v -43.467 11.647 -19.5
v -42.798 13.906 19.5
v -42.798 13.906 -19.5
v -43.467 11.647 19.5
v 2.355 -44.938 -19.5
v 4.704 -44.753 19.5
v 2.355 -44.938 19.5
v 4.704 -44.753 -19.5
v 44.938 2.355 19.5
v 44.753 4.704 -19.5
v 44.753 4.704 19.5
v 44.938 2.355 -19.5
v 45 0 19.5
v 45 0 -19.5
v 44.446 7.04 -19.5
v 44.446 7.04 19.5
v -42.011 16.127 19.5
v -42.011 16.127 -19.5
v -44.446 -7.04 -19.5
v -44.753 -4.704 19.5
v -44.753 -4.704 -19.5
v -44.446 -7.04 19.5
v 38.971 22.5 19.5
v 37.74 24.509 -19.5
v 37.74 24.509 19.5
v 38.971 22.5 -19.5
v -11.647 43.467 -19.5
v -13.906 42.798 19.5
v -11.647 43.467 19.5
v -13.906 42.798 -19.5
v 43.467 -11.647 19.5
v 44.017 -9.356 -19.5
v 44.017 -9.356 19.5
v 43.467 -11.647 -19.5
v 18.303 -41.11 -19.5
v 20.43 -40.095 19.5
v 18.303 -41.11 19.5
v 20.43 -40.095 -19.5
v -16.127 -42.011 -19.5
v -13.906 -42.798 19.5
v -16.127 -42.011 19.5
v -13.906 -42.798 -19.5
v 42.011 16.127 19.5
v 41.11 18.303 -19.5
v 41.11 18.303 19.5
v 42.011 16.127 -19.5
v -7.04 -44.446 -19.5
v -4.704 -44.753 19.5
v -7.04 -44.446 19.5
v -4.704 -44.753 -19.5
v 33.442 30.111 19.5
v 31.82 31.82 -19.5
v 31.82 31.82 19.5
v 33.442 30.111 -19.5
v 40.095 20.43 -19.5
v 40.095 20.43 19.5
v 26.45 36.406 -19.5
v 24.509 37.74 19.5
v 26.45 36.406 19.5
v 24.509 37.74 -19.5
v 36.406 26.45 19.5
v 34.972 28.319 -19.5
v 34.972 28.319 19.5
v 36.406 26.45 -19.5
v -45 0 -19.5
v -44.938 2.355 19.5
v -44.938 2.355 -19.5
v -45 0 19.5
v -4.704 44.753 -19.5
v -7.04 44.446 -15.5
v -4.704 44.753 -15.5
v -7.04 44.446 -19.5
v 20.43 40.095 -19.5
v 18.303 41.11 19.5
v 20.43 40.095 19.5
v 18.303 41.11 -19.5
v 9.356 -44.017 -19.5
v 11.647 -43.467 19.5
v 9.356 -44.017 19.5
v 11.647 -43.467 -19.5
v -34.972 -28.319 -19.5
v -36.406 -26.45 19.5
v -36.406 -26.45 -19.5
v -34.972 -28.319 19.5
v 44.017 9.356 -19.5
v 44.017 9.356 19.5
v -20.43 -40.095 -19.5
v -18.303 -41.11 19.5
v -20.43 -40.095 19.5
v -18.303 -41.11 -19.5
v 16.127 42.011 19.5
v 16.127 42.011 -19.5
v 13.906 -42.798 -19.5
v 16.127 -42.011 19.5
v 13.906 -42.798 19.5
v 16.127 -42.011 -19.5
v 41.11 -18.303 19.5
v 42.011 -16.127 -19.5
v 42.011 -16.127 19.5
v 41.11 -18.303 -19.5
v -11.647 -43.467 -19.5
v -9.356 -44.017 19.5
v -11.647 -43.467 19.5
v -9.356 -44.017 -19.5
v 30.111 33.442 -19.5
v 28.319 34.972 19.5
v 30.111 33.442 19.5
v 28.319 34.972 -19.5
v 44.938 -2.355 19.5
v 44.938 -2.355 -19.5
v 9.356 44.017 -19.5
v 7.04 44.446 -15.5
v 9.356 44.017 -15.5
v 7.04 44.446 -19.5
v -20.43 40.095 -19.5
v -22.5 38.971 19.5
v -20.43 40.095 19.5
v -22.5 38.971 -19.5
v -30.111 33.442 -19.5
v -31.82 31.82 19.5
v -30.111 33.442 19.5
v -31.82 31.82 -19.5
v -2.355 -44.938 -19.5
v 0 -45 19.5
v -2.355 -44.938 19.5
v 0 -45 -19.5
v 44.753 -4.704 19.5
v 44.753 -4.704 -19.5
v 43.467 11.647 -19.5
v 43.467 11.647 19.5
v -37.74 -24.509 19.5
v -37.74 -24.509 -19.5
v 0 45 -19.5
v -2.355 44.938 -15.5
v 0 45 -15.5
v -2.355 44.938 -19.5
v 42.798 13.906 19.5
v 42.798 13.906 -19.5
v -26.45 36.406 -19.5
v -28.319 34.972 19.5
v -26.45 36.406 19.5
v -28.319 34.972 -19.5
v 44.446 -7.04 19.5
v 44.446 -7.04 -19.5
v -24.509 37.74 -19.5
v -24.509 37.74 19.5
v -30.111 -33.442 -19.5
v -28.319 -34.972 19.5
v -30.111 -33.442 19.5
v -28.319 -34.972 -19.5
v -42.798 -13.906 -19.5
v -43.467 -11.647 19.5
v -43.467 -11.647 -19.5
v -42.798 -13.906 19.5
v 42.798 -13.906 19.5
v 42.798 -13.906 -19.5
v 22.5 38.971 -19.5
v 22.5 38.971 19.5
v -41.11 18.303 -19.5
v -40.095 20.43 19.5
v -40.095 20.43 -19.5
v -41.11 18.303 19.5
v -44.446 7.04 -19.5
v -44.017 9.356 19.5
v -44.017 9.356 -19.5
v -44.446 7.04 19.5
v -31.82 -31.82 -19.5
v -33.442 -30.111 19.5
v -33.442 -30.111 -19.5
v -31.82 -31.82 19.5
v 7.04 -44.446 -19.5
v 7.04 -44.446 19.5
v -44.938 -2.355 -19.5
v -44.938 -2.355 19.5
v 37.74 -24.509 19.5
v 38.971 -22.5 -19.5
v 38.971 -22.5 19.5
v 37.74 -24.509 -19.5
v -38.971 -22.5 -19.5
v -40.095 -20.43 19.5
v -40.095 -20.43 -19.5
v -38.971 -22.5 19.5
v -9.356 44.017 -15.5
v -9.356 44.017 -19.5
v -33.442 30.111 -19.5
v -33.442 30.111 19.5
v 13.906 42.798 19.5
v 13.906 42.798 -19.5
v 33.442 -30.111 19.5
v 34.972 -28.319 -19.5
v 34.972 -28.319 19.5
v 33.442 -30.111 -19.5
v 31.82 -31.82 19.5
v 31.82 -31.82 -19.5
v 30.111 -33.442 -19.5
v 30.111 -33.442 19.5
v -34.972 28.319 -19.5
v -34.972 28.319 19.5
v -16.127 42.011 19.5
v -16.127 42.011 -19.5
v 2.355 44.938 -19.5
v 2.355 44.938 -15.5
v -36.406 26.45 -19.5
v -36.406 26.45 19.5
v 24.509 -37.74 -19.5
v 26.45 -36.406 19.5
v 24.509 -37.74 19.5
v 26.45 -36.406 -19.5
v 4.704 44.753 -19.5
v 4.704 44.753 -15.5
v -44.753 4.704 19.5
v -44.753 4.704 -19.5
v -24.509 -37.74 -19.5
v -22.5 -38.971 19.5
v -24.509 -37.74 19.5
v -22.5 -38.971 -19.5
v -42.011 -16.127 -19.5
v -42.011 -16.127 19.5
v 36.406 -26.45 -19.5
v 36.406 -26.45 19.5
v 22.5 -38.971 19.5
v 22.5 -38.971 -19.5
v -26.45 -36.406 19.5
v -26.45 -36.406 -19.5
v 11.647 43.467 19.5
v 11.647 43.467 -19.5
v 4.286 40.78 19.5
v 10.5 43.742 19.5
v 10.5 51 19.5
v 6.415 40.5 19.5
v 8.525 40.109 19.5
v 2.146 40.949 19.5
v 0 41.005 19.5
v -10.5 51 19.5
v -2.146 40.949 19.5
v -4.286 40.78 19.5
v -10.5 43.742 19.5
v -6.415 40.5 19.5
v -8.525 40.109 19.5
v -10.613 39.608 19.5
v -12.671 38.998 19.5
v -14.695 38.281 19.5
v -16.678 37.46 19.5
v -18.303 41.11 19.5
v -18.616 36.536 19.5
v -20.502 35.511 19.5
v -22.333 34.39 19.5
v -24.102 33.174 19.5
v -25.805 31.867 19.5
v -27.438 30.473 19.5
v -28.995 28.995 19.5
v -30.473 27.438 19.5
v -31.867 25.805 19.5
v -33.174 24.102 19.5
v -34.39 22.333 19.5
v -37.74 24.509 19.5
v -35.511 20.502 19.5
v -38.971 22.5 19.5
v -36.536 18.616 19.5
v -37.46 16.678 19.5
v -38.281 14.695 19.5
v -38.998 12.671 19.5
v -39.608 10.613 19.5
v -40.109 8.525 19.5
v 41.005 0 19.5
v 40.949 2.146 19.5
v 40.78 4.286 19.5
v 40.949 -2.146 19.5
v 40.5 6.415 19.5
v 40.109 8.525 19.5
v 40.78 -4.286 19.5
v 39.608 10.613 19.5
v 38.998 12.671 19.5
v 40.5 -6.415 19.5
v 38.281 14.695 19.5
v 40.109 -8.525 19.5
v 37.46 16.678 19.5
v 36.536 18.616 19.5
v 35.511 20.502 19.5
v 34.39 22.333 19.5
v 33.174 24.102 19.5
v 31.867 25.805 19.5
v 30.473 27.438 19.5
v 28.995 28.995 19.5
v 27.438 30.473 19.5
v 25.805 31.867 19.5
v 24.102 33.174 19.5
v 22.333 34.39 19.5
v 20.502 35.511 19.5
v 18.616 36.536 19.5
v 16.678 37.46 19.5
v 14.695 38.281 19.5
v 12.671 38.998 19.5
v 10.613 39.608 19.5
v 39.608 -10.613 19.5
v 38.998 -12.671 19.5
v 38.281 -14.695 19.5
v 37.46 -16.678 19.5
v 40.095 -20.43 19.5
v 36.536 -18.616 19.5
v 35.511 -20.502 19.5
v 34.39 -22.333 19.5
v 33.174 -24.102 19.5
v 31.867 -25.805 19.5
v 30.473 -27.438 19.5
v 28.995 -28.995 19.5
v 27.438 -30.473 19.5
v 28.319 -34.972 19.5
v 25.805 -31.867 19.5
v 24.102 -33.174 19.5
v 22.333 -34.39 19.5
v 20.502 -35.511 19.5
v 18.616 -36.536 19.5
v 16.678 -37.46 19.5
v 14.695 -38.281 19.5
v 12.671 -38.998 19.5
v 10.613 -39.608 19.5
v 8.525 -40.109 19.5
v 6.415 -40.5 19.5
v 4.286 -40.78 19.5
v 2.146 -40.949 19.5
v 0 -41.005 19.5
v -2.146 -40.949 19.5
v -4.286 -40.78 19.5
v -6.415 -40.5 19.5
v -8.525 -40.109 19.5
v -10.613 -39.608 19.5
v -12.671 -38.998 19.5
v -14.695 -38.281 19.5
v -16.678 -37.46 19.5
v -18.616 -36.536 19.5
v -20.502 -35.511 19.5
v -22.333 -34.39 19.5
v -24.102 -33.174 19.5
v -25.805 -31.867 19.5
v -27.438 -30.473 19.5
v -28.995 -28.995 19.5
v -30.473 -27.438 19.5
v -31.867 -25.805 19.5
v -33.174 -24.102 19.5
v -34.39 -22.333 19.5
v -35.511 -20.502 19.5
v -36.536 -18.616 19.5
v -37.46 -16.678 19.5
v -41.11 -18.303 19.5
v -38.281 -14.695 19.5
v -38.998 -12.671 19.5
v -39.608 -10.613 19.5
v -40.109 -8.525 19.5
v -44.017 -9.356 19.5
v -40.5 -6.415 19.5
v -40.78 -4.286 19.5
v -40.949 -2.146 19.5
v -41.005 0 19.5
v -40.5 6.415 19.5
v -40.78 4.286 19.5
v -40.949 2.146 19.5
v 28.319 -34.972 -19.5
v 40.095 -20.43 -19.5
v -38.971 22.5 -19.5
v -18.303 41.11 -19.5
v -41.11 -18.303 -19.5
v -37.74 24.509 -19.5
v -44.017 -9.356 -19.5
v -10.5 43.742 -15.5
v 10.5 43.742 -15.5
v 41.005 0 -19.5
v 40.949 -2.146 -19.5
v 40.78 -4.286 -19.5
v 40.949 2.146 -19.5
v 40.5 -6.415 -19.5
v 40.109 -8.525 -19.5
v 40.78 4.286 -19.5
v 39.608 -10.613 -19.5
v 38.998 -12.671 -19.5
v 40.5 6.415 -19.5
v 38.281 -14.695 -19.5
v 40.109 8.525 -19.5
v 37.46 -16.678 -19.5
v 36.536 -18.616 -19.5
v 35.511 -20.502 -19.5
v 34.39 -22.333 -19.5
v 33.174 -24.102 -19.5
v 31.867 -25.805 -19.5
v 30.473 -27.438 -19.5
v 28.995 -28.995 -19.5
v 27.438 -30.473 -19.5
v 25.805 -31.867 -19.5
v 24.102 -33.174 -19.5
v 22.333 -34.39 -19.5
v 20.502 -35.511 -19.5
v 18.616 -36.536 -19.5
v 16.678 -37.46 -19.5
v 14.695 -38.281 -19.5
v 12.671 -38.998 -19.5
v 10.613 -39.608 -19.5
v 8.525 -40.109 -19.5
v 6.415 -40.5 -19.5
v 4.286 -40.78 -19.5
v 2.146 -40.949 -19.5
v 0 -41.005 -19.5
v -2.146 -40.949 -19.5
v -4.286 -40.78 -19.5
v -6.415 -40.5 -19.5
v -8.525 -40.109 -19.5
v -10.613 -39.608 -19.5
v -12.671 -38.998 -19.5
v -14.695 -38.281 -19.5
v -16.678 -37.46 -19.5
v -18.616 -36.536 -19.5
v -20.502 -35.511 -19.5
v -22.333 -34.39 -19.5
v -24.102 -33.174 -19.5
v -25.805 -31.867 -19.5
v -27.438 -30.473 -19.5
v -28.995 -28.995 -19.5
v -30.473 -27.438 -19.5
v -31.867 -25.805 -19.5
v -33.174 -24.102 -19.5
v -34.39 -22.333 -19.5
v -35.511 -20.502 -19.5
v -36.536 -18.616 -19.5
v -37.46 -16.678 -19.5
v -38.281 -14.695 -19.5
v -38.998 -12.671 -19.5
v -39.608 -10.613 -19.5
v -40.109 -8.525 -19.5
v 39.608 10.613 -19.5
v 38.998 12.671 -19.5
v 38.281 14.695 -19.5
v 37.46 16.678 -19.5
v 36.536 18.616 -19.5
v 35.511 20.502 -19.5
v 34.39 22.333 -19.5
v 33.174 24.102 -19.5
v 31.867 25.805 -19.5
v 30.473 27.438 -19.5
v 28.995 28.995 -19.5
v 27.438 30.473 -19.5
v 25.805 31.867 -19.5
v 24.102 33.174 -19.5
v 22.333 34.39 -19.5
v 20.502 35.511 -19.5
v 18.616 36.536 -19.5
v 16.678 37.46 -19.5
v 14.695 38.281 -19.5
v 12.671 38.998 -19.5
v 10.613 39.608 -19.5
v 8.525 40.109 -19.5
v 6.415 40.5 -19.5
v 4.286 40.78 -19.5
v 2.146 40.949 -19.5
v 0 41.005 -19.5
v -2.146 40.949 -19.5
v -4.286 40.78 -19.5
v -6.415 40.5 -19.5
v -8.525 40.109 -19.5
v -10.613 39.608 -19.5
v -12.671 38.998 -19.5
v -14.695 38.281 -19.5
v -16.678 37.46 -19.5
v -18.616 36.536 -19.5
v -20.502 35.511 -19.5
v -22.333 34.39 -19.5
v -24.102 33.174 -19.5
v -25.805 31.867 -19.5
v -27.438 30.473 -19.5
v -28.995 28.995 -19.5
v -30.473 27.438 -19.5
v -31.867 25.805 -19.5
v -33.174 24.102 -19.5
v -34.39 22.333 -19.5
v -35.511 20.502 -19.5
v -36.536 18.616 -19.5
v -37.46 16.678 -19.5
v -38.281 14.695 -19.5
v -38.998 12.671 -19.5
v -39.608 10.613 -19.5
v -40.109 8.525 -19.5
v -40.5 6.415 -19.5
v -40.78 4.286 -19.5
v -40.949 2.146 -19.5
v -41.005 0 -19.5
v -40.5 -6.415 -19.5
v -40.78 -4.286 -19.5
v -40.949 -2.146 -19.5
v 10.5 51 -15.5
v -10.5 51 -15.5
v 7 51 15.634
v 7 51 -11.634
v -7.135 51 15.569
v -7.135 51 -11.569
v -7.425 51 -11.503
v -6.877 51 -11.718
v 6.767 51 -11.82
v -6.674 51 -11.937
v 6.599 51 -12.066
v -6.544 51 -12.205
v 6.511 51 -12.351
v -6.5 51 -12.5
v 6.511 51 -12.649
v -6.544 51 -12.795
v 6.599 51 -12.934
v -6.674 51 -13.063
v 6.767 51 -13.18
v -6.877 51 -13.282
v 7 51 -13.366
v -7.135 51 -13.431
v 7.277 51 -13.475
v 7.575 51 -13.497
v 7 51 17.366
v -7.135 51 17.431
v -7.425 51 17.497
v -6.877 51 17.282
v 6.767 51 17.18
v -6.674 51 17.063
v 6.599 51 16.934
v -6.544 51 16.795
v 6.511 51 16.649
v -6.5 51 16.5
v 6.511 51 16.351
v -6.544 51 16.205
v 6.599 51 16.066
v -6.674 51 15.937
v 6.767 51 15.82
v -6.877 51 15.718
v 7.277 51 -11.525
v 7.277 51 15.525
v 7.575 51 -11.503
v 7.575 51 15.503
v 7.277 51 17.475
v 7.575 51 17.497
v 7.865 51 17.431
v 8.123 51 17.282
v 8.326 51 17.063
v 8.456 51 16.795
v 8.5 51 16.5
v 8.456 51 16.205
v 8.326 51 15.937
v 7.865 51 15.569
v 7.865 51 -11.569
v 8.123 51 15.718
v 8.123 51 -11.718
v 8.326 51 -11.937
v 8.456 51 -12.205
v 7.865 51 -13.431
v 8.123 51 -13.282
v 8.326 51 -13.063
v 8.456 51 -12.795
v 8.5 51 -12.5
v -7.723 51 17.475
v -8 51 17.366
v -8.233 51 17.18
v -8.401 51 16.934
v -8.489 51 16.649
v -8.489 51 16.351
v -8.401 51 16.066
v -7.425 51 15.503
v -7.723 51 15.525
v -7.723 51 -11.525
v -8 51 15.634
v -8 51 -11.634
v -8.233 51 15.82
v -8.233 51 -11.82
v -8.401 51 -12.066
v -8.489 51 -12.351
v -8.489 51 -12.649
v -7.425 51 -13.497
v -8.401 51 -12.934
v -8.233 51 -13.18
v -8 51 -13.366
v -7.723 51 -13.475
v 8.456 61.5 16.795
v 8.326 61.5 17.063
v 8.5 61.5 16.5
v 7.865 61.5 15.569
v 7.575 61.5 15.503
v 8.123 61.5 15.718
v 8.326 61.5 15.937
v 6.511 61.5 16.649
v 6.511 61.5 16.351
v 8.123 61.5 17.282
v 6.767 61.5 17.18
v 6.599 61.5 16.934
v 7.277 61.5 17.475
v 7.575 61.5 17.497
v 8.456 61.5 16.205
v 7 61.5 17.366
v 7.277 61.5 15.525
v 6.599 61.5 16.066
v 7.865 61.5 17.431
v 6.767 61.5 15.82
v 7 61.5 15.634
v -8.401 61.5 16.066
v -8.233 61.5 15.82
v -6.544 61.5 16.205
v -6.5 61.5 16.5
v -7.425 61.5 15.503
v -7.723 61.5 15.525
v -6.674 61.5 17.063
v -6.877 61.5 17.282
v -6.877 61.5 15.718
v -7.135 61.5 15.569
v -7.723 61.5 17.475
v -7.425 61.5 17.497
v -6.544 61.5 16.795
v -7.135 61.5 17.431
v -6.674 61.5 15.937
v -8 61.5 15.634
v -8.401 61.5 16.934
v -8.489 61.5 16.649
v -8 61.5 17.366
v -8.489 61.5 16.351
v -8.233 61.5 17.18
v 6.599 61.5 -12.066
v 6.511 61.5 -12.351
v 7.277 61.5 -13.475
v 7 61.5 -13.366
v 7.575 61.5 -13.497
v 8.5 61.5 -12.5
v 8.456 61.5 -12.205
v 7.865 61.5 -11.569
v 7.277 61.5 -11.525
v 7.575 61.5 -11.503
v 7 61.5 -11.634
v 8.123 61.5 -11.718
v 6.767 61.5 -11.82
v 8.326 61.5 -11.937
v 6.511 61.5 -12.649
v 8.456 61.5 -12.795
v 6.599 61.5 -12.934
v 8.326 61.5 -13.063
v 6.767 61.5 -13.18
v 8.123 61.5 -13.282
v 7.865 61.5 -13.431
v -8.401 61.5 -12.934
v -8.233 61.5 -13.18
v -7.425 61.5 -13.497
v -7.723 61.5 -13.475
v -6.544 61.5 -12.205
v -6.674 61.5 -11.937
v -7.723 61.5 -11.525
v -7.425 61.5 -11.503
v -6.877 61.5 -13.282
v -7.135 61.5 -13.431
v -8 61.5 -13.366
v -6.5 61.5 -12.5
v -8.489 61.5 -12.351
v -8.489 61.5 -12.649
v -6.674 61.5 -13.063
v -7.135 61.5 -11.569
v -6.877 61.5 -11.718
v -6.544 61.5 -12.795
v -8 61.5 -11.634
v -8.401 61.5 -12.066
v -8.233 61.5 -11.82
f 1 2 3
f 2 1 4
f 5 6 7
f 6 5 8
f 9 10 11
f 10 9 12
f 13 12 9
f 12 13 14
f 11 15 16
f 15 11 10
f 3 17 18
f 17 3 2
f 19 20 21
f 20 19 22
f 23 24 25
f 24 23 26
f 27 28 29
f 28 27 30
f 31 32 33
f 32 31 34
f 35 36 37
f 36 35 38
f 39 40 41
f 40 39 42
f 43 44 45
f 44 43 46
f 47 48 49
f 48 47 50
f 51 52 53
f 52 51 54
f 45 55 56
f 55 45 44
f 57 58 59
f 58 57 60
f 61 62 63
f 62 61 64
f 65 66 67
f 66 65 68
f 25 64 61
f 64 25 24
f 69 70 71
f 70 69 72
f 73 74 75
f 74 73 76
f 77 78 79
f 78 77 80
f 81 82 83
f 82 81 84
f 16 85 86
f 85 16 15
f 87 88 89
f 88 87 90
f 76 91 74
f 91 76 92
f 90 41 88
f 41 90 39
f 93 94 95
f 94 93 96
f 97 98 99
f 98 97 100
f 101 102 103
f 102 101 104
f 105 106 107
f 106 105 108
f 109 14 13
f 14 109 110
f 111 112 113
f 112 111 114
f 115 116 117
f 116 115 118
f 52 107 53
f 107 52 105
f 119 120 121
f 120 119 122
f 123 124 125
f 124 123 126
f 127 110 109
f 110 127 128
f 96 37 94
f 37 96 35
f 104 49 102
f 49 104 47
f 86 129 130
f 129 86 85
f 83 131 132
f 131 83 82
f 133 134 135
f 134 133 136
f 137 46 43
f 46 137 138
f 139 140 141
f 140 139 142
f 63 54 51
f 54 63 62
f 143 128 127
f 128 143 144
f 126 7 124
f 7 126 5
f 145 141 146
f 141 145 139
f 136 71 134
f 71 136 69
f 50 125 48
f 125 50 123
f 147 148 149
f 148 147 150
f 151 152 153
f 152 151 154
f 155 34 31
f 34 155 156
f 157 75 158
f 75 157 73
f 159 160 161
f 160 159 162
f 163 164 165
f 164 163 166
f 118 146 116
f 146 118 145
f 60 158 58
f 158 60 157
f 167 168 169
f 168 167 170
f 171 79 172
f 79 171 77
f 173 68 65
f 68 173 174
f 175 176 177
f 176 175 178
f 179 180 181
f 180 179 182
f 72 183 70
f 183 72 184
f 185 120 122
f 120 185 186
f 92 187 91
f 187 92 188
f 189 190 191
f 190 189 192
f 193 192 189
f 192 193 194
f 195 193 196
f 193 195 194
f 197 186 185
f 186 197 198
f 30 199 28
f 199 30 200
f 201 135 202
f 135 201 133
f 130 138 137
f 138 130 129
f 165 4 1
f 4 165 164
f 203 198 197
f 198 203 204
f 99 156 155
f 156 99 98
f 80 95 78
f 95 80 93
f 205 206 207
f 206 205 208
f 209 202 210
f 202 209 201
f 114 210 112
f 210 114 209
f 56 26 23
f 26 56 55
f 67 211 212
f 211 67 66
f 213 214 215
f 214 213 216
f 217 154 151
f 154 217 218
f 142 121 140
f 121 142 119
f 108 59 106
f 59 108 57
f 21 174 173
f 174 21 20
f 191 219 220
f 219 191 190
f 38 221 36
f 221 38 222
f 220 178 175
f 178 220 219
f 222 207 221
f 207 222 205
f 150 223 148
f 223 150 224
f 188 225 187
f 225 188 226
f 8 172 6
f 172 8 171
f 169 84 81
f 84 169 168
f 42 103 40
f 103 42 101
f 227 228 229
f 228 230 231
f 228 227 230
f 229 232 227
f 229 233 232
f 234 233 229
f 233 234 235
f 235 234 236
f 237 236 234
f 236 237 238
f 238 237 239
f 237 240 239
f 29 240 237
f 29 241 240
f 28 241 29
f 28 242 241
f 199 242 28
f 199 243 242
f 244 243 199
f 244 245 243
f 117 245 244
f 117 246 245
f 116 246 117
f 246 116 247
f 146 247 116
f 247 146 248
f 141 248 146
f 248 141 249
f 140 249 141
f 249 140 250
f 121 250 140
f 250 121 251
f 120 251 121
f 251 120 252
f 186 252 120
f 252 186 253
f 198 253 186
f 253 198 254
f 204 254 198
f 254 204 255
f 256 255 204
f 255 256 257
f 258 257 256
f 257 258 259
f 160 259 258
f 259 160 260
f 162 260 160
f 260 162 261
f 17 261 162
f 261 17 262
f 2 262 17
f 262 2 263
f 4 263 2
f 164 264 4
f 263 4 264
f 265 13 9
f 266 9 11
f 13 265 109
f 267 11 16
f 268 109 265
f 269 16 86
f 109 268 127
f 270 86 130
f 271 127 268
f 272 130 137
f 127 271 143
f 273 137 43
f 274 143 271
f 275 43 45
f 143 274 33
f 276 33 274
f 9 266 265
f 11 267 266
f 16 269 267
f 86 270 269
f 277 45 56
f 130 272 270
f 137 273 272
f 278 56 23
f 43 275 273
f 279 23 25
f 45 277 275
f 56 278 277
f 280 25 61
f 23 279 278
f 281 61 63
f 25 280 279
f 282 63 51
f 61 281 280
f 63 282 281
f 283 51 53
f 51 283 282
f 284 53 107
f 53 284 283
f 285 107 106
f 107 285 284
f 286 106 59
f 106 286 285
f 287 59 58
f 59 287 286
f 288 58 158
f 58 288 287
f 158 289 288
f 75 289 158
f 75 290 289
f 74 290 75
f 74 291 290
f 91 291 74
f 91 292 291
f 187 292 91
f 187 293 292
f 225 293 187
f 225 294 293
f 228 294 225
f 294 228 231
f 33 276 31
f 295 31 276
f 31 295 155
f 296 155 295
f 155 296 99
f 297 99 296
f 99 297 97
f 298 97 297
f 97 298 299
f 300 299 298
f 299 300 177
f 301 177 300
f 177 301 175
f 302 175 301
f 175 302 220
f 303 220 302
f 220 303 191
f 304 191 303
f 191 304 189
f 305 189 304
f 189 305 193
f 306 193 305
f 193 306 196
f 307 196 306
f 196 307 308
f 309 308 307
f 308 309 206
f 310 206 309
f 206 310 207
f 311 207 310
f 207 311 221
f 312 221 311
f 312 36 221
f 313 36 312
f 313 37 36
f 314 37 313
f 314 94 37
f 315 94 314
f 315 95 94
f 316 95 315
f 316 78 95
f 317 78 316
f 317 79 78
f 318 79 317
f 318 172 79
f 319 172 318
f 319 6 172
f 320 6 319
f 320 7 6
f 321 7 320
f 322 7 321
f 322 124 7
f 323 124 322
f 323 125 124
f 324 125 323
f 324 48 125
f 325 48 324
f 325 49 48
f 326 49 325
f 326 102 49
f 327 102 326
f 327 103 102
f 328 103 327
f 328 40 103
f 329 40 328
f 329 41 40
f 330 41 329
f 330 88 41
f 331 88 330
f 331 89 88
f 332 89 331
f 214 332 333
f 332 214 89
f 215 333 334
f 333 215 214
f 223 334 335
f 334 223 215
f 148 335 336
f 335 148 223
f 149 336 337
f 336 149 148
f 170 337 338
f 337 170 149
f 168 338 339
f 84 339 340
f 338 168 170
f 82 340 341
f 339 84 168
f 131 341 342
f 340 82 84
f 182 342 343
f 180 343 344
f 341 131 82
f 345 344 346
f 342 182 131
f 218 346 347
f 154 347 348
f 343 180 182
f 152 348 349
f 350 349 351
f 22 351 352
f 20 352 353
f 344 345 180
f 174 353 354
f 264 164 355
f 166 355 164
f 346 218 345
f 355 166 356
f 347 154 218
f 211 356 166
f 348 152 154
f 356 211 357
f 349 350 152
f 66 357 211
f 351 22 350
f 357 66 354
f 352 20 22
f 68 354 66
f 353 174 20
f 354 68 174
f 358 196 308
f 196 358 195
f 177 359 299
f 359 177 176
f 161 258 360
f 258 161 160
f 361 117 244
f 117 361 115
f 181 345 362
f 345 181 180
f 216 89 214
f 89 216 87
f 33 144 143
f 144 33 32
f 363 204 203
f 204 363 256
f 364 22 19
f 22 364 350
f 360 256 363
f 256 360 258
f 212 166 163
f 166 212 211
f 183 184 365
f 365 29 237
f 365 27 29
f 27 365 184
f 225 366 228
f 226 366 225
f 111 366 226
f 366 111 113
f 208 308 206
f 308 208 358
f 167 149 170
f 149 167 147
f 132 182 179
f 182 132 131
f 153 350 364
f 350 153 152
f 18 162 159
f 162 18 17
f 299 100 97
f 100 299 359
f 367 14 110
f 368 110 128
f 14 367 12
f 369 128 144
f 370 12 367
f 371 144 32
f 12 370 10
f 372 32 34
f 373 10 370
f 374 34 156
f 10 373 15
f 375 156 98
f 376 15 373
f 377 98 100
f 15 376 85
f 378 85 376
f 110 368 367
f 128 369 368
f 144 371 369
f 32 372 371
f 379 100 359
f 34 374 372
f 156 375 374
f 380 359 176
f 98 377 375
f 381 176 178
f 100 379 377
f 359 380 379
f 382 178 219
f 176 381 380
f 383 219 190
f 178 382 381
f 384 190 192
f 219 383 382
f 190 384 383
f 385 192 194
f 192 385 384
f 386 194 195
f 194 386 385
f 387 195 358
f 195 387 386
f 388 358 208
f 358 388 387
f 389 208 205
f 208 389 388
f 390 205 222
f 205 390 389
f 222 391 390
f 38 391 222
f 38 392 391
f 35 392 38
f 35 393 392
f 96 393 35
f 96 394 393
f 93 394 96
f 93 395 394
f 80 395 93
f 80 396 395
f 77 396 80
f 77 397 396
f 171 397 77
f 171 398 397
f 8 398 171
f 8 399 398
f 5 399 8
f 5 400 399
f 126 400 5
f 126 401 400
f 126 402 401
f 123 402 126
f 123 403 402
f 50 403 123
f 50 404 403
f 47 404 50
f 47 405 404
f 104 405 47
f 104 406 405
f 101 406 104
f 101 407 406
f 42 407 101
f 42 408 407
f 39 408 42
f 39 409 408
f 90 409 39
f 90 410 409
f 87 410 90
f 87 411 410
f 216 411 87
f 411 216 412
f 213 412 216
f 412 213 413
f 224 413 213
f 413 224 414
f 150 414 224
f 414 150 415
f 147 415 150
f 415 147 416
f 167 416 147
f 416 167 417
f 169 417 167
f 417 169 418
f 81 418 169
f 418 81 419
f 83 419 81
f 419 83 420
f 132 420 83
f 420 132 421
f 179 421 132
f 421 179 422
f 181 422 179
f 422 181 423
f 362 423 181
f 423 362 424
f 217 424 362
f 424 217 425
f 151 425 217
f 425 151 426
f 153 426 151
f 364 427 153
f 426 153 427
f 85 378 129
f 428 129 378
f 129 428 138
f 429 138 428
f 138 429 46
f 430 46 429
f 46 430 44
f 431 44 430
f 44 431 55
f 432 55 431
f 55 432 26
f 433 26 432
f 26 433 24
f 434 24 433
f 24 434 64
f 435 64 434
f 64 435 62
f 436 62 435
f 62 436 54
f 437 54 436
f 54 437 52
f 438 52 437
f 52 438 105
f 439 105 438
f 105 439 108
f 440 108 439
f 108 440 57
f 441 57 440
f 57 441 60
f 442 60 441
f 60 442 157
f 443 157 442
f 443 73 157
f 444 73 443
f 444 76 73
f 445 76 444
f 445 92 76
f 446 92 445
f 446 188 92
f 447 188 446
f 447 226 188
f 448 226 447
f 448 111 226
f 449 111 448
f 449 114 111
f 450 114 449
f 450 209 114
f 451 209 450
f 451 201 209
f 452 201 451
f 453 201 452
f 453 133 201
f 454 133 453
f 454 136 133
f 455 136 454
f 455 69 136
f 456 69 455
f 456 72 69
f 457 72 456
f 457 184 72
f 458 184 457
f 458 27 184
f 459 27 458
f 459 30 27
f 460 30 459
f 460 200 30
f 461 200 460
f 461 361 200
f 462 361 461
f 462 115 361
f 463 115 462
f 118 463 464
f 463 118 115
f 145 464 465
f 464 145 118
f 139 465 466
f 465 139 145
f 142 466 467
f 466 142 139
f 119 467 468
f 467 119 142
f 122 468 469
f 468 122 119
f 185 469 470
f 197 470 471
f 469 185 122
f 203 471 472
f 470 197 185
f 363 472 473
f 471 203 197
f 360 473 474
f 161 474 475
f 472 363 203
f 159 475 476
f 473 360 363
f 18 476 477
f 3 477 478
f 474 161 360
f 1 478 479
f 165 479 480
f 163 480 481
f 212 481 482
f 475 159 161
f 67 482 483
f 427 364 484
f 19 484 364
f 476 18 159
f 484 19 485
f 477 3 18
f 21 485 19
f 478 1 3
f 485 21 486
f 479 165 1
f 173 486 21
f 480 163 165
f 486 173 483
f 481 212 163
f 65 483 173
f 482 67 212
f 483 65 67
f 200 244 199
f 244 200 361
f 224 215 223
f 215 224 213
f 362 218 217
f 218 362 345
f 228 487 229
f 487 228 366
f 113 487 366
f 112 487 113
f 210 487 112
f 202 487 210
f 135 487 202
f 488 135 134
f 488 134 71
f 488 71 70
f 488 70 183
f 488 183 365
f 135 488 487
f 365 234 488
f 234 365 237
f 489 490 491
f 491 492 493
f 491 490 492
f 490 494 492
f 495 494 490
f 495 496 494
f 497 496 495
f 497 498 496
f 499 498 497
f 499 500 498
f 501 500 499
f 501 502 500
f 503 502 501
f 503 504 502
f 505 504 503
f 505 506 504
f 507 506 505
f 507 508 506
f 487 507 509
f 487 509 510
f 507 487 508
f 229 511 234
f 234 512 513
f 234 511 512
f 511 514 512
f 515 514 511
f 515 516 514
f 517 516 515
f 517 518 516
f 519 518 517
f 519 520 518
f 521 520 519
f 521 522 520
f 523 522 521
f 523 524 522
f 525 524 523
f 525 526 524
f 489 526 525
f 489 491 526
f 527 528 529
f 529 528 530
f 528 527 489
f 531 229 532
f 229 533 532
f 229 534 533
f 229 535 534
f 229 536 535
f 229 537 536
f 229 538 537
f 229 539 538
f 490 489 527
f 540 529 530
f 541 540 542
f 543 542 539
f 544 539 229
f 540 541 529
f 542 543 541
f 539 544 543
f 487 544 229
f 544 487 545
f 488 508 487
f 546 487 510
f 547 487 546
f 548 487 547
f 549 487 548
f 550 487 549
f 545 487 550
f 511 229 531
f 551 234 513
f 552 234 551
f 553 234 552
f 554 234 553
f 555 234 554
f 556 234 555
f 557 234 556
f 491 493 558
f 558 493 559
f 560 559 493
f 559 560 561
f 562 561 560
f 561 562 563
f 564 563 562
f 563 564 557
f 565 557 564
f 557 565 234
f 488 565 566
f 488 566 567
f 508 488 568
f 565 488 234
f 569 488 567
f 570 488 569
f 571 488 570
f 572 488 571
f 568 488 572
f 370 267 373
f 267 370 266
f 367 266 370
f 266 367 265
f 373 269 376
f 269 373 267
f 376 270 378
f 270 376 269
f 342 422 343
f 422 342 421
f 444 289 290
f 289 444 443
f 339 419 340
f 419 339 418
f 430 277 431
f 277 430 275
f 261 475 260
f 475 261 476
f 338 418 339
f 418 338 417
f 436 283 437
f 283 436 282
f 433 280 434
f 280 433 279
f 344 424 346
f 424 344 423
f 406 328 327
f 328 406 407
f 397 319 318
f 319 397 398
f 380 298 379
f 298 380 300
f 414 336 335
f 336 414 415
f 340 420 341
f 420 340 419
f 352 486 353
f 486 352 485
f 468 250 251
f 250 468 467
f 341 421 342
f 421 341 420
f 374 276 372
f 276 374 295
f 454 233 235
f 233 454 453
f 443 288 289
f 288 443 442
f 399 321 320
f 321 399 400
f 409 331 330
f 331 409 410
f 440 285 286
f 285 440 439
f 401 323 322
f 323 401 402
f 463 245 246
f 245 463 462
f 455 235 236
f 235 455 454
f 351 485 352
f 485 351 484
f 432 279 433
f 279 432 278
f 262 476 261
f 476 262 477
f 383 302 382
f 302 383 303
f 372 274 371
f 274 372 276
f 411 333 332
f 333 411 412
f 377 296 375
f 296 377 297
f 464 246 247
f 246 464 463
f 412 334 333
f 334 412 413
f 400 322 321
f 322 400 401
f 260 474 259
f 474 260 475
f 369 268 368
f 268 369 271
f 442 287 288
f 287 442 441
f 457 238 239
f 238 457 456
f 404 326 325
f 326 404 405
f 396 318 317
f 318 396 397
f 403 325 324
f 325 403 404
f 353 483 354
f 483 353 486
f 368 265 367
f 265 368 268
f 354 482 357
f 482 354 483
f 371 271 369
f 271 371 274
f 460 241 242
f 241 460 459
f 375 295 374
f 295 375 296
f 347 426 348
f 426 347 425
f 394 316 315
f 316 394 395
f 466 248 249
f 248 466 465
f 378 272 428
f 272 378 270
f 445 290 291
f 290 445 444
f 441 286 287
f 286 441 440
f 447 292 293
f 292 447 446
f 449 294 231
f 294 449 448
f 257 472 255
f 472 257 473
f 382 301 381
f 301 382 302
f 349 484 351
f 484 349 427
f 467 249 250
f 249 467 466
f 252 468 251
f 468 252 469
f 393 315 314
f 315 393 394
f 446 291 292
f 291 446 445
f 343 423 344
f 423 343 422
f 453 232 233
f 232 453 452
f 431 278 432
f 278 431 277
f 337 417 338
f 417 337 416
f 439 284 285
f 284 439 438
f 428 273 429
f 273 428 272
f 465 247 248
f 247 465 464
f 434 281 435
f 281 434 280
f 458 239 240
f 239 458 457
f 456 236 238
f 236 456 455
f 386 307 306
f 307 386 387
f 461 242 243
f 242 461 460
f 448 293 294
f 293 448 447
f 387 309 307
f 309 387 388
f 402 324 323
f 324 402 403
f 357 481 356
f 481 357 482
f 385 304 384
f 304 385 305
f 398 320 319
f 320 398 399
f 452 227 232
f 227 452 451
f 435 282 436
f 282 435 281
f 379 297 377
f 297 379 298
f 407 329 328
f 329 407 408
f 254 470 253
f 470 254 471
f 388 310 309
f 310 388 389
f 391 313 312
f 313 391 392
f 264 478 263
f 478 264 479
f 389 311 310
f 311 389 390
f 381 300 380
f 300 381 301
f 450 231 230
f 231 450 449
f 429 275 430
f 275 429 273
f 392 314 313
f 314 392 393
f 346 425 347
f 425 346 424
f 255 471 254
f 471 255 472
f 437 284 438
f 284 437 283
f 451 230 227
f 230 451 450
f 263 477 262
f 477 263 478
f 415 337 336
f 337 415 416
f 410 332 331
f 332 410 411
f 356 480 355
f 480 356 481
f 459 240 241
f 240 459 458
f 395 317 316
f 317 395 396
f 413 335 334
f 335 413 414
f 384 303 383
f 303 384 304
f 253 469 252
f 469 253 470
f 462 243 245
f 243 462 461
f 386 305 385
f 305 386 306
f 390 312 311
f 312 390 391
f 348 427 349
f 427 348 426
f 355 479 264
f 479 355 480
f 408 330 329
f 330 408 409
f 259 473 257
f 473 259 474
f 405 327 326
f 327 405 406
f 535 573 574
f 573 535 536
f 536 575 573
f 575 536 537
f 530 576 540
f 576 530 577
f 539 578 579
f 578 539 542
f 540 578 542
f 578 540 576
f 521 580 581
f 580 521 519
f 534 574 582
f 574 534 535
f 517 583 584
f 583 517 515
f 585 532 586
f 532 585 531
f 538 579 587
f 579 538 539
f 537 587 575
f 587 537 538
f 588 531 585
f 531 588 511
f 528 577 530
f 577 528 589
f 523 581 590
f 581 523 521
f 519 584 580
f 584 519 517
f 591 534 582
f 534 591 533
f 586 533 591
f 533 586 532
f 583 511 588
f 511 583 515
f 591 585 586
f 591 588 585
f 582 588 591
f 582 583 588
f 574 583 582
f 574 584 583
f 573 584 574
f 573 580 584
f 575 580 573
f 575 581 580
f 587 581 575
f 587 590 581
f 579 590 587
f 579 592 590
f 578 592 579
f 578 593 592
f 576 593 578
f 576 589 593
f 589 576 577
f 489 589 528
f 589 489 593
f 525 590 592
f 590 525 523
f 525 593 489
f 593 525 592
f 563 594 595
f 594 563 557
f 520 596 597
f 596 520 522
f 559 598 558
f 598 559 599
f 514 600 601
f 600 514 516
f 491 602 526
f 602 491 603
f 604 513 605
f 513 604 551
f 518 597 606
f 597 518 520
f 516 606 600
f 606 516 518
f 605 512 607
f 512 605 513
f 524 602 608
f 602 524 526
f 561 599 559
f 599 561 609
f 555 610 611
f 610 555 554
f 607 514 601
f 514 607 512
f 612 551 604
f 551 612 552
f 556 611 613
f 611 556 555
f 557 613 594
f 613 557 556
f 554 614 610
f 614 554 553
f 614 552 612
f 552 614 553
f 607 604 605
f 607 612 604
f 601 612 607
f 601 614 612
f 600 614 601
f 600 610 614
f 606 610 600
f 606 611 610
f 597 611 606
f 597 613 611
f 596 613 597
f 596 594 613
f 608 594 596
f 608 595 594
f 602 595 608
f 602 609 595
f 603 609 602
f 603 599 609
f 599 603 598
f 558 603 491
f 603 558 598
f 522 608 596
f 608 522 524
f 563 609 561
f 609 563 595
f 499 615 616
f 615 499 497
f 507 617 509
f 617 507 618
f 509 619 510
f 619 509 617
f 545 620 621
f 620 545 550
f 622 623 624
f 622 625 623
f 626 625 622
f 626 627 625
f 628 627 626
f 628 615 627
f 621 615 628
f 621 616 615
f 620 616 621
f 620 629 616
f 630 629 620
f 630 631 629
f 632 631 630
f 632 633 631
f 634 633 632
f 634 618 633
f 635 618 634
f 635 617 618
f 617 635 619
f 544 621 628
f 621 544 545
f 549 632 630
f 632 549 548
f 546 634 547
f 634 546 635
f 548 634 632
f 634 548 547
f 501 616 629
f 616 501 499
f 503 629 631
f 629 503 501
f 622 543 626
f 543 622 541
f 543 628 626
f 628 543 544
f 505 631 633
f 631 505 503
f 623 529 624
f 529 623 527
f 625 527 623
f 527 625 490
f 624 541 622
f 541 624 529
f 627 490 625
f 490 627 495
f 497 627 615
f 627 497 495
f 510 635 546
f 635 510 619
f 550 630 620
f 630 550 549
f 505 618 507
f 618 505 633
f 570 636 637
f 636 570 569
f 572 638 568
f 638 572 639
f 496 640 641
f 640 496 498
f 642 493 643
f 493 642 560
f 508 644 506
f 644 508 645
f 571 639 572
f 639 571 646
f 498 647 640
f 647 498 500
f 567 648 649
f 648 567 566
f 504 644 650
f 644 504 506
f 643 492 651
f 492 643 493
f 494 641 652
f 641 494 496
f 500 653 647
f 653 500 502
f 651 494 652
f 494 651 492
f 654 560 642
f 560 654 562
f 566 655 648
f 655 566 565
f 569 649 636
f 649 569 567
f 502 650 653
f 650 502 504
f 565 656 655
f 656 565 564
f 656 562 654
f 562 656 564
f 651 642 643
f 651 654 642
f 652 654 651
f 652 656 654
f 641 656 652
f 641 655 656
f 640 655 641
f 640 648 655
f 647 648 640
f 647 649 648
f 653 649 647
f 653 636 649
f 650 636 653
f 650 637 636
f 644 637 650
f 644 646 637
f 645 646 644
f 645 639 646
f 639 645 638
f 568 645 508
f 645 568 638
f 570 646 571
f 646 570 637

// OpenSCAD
// file: config.scad
// Configuració general

// Cos principal
height_cyli = 298;
wall_width = 6.35;
inner_diameter = 76.2;
diameter_cyli = inner_diameter + wall_width*2;

// Motors
motor_diameter = 90;
motor_height = 39;
// main file
include <config.scad>
$fa = 3;
$fs = 0.3;


module perns(d=2,l=10.5){
    color([0.6,0.6,0.6]){
    translate([7.5,motor_diameter/2+6+10.5/2,16.5])
        rotate([90,0,0])
        cylinder(h=l,d=d,center=true); 
    translate([-7.5,motor_diameter/2+6+10.5/2,16.5])
        rotate([90,0,0])
        cylinder(h=l,d=d,center=true);
    translate([7.5,motor_diameter/2+6+10.5/2,-12.5])
        rotate([90,0,0])
        cylinder(h=l,d=d,center=true);
    translate([-7.5,motor_diameter/2+6+10.5/2,-12.5])
        rotate([90,0,0])
        cylinder(h=l,d=d,center=true); 
    }  
}





module motor(d=motor_diameter, h=motor_height){
    union(){
    color([0.88,0.88,0.68]){        
    difference(){
        
        union(){ 
            cylinder(h=h,d=d,center=true);
    
            translate([0,(d)/2,2])
            cube([21,12,35],center=true);
           }
        translate([0,0,0])
        cylinder(h=h+0.2,d=(d-8)+0.01,center=true);
        }
    }
    perns();
}


}
motor();
